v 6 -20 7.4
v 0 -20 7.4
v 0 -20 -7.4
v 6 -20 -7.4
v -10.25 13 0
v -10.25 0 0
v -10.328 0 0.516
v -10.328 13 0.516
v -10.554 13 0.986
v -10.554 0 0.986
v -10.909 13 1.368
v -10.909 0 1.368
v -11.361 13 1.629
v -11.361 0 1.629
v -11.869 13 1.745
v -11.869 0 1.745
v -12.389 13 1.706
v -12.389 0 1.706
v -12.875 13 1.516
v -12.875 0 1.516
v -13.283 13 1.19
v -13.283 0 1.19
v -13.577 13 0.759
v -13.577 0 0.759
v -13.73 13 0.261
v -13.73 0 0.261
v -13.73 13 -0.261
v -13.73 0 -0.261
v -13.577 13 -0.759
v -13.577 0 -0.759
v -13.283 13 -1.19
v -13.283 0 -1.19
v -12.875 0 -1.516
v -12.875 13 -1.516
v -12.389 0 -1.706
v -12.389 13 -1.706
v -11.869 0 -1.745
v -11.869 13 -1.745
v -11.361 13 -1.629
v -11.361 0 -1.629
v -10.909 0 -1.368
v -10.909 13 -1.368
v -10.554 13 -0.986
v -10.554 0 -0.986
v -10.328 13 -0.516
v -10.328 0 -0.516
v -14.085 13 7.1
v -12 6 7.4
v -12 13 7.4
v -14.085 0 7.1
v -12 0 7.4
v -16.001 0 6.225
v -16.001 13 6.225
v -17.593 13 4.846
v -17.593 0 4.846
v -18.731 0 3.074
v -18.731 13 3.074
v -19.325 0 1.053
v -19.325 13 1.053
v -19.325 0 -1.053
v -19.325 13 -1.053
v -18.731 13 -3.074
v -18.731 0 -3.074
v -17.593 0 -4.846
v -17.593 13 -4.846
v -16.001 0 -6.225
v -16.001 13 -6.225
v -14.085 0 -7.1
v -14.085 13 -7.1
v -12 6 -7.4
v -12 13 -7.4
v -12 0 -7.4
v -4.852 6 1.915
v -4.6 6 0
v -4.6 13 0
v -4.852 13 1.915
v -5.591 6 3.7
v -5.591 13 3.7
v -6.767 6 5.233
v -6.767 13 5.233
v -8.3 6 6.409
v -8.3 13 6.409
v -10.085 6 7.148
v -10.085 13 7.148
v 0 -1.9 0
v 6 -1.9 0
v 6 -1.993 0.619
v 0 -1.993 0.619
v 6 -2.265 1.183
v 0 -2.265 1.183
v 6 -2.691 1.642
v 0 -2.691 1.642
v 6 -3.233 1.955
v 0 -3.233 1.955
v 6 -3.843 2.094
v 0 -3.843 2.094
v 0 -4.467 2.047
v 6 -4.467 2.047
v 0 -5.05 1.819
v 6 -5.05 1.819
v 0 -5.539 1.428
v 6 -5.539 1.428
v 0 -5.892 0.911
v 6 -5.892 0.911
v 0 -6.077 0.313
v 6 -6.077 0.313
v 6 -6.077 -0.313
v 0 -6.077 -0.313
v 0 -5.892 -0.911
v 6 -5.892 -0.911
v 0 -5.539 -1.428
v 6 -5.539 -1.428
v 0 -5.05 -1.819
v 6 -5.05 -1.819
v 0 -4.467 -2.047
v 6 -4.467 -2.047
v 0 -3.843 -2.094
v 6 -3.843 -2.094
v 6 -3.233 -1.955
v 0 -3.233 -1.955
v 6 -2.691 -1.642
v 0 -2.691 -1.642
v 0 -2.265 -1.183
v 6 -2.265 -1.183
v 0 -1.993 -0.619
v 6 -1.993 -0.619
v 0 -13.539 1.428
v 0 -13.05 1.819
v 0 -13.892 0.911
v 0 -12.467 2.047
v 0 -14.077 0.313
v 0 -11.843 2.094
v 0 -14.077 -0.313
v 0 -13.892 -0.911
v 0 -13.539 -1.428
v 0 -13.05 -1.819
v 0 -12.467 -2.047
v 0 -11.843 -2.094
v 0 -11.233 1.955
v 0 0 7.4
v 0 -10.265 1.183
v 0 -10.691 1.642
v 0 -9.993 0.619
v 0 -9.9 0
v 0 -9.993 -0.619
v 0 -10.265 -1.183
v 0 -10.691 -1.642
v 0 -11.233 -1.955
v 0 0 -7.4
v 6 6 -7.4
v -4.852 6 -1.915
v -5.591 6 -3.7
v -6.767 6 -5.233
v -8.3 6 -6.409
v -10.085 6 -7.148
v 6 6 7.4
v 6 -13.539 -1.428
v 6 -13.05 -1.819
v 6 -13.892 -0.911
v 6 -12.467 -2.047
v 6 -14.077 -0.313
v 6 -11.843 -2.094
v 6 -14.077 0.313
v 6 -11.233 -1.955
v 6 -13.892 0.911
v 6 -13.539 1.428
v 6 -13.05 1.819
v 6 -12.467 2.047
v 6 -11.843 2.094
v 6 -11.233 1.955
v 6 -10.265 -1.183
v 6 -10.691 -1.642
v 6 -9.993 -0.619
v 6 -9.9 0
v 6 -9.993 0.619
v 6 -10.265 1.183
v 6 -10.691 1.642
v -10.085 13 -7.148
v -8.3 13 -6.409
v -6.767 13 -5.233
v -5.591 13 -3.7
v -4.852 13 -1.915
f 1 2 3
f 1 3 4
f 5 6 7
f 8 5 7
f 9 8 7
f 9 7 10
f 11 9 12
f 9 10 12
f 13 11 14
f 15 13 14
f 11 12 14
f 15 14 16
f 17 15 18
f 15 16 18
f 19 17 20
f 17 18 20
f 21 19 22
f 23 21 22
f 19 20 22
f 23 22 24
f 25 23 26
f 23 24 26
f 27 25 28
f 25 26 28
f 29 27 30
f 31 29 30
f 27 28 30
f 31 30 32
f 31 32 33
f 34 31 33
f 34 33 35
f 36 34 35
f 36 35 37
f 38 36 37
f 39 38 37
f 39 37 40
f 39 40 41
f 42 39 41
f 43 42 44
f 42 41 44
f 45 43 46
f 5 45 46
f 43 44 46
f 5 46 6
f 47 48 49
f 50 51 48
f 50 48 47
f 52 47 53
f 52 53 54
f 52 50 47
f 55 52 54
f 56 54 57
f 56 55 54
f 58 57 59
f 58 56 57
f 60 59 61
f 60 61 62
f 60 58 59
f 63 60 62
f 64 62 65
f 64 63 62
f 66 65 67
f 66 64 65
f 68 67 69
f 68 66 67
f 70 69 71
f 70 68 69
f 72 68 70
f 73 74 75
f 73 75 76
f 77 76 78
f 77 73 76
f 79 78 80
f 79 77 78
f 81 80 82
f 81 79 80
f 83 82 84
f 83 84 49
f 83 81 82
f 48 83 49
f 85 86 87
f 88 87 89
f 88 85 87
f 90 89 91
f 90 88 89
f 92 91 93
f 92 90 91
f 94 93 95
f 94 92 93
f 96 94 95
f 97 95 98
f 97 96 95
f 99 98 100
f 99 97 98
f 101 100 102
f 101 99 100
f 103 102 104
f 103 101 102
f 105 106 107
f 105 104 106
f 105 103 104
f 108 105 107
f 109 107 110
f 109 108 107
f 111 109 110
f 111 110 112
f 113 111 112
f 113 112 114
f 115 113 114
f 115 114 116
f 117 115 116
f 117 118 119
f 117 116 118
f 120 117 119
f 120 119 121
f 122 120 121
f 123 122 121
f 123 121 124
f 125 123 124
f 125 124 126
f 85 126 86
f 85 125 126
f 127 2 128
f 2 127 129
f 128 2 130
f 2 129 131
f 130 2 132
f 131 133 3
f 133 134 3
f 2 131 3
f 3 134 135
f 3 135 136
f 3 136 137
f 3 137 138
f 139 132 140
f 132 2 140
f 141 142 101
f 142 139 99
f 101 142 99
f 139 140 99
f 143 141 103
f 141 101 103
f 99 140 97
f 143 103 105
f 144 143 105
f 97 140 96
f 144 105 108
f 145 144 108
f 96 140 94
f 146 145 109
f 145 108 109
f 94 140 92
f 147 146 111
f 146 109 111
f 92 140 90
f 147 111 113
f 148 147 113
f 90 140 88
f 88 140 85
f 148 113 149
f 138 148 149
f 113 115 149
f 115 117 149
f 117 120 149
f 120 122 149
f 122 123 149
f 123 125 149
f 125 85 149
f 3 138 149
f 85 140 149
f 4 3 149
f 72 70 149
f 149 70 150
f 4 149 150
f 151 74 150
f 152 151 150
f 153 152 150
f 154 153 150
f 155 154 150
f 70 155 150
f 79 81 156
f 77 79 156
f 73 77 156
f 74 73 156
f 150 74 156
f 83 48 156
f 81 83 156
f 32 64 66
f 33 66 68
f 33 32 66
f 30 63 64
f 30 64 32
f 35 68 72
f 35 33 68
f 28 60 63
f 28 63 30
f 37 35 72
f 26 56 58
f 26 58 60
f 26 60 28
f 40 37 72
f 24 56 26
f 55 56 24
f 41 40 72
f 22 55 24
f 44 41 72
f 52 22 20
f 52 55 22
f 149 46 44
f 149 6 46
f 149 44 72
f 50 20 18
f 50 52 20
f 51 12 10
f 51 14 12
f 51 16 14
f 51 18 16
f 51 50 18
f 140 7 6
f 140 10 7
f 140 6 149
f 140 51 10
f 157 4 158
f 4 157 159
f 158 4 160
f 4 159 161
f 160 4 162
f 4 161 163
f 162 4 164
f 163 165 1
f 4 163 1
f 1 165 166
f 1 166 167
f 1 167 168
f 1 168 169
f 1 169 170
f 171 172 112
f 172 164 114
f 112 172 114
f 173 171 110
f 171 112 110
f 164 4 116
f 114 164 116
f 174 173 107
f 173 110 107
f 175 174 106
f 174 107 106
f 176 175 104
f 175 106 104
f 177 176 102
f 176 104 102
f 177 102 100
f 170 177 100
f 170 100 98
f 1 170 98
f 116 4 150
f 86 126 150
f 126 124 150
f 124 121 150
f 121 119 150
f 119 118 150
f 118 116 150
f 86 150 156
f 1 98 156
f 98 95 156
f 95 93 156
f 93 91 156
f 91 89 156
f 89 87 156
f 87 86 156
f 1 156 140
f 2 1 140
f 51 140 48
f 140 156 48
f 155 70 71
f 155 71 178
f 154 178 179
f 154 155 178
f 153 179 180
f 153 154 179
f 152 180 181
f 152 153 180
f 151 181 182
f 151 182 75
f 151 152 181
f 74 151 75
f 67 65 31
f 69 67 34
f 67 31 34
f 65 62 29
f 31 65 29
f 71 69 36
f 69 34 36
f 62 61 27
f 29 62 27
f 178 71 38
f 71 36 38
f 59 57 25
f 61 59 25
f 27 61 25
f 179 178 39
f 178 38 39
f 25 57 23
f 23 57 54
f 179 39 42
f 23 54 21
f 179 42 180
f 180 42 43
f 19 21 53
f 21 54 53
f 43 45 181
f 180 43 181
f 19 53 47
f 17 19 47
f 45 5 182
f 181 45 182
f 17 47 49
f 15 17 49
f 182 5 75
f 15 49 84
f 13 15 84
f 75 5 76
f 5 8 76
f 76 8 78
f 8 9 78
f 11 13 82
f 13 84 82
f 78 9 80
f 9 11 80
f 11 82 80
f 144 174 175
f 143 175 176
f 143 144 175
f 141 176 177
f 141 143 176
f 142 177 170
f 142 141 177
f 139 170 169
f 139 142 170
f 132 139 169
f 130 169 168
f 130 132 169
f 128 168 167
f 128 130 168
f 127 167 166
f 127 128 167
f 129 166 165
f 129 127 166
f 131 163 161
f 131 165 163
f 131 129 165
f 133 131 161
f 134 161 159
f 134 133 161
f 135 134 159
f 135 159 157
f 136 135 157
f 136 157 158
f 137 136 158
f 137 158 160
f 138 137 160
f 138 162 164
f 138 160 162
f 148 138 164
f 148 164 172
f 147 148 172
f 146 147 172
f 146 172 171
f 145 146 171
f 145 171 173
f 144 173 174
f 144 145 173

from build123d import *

# Parameters (mm, degrees)
F0_R     = 1.75
F1_DEPTH = 13
F2_DEPTH = 6
F3_DEPTH = 20
F4_R     = 2.1
F5_DEPTH = 25


with BuildPart() as f1:
    # F0 (on Front) → F1 (new body)
    with BuildSketch(Plane.XZ):
        with BuildLine():
            ThreePointArc((-12, -7.4), (-6.76741, -5.23259), (-4.6, 0))
            ThreePointArc((-4.6, 0), (-6.76741, 5.23259), (-12, 7.4))
            ThreePointArc((-12, 7.4), (-19.4, 0), (-12, -7.4))
        make_face()
        with Locations((-12, 0)):
            Circle(F0_R, mode=Mode.SUBTRACT)
    extrude(amount=-F1_DEPTH)

    # F0 (on Front) → F2 (join)
    with BuildSketch(Plane.XZ):
        with BuildLine():
            ThreePointArc((-12, 7.4), (-6.76741, 5.23259), (-4.6, 0))
            ThreePointArc((-4.6, 0), (-6.76741, -5.23259), (-12, -7.4))
            Line((-12, -7.4), (0, -7.4))
            Line((0, -7.4), (0, 0))
            Line((0, 0), (0, 7.4))
            Line((0, 7.4), (-12, 7.4))
        make_face()
        Polygon((6, 7.4), (0, 7.4), (0, 0), (0, -7.4), (6, -7.4), align=None)
    extrude(amount=-F2_DEPTH)

    # F0 (on Front) → F3 (join)
    with BuildSketch(Plane.XZ):
        Polygon((6, 7.4), (0, 7.4), (0, 0), (0, -7.4), (6, -7.4), align=None)
    extrude(amount=F3_DEPTH)

    # F4 (on Right) → F5 (cut)
    with BuildSketch(Plane.YZ):
        with Locations((-12, 0)):
            Circle(F4_R)
        with Locations((-4, 0)):
            Circle(F4_R)
    extrude(amount=F5_DEPTH, mode=Mode.SUBTRACT)


solid = f1.part
